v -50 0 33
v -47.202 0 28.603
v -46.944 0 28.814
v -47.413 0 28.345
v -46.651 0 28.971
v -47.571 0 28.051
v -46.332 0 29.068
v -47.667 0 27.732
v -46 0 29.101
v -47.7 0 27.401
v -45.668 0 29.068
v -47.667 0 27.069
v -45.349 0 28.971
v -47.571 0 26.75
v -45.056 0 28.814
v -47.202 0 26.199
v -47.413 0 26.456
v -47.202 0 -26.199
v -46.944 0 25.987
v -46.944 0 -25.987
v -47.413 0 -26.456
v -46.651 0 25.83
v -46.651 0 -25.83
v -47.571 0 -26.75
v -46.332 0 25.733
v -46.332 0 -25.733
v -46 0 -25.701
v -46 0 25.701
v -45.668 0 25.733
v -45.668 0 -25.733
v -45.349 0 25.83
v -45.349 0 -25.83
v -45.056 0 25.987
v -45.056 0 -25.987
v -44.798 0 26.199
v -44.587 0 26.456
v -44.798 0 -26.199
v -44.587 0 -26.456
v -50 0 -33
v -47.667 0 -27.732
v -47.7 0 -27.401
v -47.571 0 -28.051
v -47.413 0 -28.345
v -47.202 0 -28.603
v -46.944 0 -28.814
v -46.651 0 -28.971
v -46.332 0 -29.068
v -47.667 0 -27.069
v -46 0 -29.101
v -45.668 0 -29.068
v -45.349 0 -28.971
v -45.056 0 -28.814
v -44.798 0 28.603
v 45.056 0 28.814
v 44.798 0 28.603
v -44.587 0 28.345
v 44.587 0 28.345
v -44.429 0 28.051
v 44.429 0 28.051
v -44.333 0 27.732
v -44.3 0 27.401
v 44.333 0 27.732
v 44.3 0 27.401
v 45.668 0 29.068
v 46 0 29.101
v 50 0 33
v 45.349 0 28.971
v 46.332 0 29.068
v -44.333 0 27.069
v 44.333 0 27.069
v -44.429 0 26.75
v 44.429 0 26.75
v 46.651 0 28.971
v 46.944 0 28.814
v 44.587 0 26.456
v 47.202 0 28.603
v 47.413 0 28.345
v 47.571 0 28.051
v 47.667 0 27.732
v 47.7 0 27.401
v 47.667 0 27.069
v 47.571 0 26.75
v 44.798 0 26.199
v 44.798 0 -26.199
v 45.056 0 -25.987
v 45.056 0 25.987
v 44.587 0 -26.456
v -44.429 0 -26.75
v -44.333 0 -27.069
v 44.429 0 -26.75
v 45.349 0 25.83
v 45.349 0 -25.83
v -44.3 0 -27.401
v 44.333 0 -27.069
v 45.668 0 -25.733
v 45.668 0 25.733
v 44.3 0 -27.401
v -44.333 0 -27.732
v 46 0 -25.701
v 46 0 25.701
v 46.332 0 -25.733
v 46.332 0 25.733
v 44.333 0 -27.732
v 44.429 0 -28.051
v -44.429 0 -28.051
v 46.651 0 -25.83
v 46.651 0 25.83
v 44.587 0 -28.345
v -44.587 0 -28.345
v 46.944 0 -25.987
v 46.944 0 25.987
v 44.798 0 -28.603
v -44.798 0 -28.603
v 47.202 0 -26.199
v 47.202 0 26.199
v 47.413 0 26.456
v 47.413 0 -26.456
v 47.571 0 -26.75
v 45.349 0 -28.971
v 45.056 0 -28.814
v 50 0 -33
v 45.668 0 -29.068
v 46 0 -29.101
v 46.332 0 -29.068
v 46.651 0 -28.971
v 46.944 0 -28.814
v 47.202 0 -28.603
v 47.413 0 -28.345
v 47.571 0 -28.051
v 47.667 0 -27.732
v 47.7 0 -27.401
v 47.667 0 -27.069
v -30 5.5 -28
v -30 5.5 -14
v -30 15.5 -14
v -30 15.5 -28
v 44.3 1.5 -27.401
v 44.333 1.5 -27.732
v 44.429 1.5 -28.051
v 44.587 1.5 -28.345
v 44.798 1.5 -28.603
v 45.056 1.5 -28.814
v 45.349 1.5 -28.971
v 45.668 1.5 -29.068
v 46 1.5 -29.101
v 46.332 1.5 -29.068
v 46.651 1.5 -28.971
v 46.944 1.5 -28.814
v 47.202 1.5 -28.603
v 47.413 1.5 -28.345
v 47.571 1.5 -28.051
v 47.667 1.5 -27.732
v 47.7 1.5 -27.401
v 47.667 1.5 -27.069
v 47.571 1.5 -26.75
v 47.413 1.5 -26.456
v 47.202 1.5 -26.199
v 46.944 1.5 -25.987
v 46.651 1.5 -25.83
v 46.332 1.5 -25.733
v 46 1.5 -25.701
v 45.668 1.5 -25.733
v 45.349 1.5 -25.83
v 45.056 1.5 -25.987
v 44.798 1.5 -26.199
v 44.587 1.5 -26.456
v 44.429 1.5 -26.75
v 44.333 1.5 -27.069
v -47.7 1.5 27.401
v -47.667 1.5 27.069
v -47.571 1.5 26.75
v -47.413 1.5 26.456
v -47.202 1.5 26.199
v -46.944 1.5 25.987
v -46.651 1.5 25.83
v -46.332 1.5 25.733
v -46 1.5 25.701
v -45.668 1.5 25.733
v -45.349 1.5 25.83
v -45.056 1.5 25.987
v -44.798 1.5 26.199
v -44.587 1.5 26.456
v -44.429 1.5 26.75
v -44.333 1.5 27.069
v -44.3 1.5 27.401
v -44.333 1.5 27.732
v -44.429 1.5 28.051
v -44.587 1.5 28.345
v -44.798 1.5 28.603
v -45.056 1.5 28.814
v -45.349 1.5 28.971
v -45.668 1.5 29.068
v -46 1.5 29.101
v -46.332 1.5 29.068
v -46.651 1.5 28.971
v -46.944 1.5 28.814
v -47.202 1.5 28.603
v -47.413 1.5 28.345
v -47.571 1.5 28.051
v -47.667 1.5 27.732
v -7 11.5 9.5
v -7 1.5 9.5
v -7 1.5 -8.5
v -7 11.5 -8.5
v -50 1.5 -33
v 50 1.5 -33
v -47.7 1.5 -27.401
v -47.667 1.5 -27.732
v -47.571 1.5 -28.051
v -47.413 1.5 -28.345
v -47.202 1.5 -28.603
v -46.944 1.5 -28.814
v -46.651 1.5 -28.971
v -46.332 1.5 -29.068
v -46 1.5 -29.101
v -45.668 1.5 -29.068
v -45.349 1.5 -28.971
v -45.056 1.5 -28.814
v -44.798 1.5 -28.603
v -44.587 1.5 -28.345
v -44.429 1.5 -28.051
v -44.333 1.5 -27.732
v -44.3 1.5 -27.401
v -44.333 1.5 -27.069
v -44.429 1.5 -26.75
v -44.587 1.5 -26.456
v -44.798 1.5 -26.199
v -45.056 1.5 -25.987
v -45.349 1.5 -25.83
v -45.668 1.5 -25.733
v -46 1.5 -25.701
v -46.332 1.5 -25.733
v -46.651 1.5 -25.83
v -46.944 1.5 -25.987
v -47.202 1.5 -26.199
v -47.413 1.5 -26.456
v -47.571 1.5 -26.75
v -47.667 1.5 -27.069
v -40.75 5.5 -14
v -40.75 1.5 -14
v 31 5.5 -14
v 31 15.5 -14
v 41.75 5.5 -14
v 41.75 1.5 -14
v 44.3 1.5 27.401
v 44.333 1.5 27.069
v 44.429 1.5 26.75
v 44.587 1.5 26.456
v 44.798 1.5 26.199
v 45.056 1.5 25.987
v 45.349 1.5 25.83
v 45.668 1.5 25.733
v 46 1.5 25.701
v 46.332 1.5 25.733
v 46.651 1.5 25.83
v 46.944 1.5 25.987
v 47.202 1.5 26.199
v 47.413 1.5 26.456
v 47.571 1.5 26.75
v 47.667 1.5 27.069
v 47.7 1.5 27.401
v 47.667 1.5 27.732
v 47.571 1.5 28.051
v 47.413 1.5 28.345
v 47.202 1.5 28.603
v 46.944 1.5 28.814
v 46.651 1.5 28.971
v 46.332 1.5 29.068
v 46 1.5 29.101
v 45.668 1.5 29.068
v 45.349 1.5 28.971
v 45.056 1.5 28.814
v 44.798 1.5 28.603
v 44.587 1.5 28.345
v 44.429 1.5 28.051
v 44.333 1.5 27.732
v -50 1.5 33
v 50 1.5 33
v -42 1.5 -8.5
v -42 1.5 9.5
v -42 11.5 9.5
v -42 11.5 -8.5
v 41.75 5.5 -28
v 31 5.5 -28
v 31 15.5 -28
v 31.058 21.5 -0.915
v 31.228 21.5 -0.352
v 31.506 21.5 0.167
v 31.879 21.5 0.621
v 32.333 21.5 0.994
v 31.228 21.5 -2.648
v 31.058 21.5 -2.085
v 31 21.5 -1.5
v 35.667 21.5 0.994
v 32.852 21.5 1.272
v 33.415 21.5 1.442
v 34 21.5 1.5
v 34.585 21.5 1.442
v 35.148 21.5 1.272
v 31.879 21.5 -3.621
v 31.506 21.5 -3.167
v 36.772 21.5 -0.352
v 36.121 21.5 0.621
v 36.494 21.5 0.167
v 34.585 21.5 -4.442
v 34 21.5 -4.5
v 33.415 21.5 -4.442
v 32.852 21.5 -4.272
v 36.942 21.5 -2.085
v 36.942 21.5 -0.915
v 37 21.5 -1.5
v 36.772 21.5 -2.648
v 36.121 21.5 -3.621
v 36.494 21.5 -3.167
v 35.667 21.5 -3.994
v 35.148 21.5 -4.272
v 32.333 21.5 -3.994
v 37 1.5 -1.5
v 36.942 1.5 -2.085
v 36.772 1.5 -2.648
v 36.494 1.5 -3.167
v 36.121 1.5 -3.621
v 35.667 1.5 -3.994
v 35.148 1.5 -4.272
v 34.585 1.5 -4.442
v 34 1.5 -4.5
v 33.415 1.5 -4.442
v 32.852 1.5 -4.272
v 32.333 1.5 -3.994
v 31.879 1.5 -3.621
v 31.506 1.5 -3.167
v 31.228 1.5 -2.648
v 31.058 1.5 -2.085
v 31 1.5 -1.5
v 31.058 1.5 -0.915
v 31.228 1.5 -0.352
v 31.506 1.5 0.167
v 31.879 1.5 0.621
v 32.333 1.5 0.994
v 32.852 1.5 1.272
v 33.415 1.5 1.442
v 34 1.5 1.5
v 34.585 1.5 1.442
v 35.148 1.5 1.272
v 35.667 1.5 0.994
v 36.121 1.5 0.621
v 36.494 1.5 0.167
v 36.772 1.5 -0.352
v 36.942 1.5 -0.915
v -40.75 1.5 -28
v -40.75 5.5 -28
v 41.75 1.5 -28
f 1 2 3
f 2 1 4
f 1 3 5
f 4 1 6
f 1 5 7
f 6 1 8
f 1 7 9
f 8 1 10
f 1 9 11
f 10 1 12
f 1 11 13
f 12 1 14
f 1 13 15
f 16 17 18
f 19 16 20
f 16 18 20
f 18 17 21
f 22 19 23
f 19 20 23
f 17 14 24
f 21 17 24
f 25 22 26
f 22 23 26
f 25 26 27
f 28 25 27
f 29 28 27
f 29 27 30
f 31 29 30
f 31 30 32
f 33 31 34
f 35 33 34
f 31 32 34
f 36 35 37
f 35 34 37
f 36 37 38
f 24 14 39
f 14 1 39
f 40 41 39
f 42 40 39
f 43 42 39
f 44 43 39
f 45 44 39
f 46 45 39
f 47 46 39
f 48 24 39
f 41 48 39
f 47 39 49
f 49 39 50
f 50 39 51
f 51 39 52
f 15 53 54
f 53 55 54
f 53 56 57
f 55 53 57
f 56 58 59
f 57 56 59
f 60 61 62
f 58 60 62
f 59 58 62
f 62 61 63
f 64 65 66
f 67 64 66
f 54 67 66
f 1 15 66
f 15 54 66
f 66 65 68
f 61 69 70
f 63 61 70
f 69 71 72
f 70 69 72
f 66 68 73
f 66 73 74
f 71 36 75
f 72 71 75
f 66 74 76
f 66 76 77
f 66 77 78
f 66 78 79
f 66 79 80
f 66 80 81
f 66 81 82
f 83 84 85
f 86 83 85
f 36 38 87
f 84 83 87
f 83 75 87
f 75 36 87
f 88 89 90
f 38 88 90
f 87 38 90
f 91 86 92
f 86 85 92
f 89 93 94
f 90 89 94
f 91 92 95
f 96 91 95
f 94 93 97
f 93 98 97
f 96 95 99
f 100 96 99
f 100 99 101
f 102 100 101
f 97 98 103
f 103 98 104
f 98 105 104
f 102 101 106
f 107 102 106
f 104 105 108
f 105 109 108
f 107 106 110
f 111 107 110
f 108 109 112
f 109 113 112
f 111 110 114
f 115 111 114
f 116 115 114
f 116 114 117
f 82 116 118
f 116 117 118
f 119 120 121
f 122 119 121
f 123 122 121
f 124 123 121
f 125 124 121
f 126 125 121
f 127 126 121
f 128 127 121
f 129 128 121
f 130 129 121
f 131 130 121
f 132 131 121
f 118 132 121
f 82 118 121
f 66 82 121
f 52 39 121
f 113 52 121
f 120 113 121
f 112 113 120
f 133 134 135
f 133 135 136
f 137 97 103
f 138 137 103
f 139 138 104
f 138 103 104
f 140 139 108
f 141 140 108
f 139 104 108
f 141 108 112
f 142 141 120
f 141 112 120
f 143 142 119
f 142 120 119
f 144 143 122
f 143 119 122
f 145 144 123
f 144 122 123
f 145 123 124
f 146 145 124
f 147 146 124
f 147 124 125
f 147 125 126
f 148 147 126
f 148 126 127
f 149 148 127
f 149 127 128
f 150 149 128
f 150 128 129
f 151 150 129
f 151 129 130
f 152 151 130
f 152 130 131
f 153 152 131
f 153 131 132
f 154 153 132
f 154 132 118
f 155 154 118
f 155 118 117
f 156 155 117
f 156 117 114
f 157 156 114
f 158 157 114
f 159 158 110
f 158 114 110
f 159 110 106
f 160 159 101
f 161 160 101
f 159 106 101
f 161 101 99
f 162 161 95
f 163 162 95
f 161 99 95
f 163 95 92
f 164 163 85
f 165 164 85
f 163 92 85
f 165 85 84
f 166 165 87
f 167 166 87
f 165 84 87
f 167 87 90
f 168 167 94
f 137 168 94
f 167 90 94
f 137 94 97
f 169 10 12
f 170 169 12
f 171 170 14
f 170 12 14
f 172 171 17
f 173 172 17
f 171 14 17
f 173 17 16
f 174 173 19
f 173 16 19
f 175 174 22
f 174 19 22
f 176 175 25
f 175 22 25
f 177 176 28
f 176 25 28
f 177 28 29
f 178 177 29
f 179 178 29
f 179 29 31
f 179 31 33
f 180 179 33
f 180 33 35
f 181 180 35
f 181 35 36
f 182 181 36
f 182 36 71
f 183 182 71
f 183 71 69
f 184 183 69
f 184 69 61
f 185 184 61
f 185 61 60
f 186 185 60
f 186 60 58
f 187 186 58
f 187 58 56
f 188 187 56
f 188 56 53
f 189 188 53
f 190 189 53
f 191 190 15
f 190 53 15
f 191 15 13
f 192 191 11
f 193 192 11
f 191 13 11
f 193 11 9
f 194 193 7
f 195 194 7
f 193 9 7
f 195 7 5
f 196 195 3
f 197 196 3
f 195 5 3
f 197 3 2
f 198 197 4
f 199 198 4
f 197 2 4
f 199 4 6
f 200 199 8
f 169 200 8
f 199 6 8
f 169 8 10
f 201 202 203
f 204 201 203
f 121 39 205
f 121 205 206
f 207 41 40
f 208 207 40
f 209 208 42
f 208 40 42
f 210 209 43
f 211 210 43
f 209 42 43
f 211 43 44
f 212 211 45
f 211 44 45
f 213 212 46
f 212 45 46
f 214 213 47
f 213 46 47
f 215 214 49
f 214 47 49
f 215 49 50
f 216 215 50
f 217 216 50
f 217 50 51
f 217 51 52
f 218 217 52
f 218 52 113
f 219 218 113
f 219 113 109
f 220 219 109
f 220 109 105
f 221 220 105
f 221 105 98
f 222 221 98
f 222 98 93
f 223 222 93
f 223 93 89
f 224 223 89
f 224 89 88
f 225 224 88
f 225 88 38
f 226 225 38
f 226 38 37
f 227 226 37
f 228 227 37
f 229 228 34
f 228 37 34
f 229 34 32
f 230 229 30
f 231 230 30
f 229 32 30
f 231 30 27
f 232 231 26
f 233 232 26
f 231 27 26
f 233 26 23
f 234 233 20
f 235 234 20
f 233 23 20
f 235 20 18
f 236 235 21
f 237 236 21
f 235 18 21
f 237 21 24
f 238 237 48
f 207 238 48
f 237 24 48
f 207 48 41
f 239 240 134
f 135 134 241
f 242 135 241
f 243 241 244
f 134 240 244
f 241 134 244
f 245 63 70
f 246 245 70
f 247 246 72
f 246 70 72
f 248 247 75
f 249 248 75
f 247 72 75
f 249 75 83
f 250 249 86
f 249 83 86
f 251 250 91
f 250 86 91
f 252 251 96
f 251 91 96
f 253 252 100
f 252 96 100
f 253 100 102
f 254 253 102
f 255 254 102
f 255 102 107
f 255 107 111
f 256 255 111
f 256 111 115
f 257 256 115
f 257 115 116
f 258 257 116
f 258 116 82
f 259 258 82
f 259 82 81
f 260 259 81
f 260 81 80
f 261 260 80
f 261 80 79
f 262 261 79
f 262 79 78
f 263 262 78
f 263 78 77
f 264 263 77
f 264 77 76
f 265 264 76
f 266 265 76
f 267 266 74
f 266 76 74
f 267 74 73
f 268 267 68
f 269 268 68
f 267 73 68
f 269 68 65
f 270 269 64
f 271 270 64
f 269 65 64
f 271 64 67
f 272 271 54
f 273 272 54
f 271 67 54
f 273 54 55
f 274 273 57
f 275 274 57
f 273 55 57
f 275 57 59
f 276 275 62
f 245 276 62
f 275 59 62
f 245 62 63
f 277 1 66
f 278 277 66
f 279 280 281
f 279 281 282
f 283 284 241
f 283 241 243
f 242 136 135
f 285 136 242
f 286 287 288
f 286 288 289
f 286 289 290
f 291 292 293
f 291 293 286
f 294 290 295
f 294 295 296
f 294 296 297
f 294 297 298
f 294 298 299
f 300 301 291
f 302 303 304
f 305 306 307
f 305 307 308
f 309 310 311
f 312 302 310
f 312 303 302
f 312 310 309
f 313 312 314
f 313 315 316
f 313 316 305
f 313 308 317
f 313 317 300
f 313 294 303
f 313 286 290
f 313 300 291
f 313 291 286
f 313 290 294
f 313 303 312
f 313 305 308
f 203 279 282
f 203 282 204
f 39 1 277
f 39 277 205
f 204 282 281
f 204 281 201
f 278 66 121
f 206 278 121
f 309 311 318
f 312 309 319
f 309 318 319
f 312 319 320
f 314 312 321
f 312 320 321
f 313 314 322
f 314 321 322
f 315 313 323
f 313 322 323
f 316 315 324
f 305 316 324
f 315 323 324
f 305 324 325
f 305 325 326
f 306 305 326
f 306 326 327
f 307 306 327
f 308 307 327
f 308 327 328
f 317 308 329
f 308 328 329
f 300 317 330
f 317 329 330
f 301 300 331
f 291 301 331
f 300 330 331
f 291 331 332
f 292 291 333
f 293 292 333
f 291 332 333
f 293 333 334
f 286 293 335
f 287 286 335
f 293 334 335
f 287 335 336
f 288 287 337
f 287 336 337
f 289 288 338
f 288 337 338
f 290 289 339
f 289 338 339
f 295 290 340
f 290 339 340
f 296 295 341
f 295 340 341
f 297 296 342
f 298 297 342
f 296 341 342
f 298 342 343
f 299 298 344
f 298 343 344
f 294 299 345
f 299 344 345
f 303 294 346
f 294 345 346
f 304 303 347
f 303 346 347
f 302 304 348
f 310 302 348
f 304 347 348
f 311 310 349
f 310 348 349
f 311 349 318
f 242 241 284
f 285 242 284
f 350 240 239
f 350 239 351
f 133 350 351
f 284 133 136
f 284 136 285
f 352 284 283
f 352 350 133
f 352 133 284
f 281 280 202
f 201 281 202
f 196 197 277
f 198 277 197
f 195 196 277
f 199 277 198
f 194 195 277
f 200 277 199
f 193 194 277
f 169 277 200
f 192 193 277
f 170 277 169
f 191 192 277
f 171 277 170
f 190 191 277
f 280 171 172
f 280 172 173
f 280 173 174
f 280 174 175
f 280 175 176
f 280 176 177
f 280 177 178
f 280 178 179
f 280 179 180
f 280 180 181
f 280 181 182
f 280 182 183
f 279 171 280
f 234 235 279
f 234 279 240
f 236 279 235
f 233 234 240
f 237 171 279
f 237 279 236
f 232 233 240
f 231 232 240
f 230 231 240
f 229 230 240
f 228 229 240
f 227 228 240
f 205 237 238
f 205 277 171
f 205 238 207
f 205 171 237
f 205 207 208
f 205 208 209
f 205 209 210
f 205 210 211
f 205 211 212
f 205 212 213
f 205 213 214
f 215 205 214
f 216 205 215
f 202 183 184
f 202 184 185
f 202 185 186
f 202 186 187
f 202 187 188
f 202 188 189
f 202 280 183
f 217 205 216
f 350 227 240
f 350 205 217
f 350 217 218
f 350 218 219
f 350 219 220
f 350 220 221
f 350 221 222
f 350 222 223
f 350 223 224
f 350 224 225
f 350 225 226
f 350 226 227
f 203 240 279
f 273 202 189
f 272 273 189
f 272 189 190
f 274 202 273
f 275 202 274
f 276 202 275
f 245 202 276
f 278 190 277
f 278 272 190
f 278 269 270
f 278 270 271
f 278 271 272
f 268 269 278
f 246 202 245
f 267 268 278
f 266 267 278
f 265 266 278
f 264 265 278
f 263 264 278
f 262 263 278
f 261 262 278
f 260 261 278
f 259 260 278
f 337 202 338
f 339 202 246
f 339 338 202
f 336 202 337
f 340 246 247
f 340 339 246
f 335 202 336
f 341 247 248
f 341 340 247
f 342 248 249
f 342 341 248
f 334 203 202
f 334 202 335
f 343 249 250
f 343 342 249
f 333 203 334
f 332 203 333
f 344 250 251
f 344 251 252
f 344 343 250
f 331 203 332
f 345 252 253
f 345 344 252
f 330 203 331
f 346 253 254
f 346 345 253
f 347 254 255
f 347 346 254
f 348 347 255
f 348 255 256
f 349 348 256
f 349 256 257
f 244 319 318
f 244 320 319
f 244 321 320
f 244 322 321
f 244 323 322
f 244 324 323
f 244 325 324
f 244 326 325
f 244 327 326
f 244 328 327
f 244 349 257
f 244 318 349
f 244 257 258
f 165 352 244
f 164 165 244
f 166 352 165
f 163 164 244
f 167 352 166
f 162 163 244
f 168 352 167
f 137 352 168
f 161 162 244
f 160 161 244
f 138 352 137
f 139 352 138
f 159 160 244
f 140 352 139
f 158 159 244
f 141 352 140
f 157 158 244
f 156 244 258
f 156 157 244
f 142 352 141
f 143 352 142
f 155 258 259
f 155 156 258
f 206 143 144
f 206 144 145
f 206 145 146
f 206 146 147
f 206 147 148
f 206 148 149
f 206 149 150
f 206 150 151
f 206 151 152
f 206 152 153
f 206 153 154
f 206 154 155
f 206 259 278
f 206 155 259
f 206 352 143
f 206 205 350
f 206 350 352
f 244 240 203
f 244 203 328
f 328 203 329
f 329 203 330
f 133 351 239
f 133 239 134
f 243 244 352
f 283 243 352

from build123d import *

# Parameters (mm, degrees)
SKIZZE1_W                       = 100
SKIZZE1_H                       = 66
AUFSATZ_LINEAR_AUSTRAGEN1_DEPTH = 1.5
SKIZZE2_W                       = 61
SKIZZE2_H                       = 14
AUFSATZ_LINEAR_AUSTRAGEN2_DEPTH = 14
SKIZZE6_W                       = 82.5
SKIZZE6_H                       = 14
AUFSATZ_LINEAR_AUSTRAGEN4_DEPTH = 4
SKIZZE3_R                       = 3
AUFSATZ_LINEAR_AUSTRAGEN3_DEPTH = 20
DURCHGANGSLOCH_F_R_M31_D        = 3.4
SKIZZE7_W                       = 35
SKIZZE7_H                       = 18
AUFSATZ_LINEAR_AUSTRAGEN5_DEPTH = 10


with BuildPart() as part:
    # Skizze1 → Aufsatz-Linear austragen1 (new body)
    with BuildSketch(Plane(origin=(0, 0, 0), x_dir=(1, 0, 0), z_dir=(0, 1, 0))):
        Rectangle(SKIZZE1_W, SKIZZE1_H)
    extrude(amount=AUFSATZ_LINEAR_AUSTRAGEN1_DEPTH)

    # Skizze2 → Aufsatz-Linear austragen2 (add)
    with BuildSketch(Plane(origin=(0, 1.5, 0), x_dir=(1, 0, 0), z_dir=(0, 1, 0))):
        with Locations((0.5, 21)):
            Rectangle(SKIZZE2_W, SKIZZE2_H)
    extrude(amount=AUFSATZ_LINEAR_AUSTRAGEN2_DEPTH)

    # Skizze6 → Aufsatz-Linear austragen4 (add)
    with BuildSketch(Plane(origin=(0, 1.5, 0), x_dir=(1, 0, 0), z_dir=(0, 1, 0))):
        with Locations((0.5, 21)):
            Rectangle(SKIZZE6_W, SKIZZE6_H)
    extrude(amount=AUFSATZ_LINEAR_AUSTRAGEN4_DEPTH)

    # Skizze3 → Aufsatz-Linear austragen3 (add)
    with BuildSketch(Plane(origin=(0, 1.5, 0), x_dir=(1, 0, 0), z_dir=(0, 1, 0))):
        with Locations((34, 1.5)):
            Circle(SKIZZE3_R)
    extrude(amount=AUFSATZ_LINEAR_AUSTRAGEN3_DEPTH)

    # Durchgangsloch für M31 (through all)
    with Locations(Plane(origin=(0, 1.5, 0), x_dir=(1, 0, 0), z_dir=(0, 1, 0))):
        with Locations((-46, -27.400776428), (-46, 27.400776428), (46, 27.400776428), (46, -27.400776428)):
            Hole(DURCHGANGSLOCH_F_R_M31_D / 2)

    # Skizze7 → Aufsatz-Linear austragen5 (add)
    with BuildSketch(Plane(origin=(0, 1.5, 0), x_dir=(1, 0, 0), z_dir=(0, 1, 0))):
        with Locations((-24.5, -0.5)):
            Rectangle(SKIZZE7_W, SKIZZE7_H)
    extrude(amount=AUFSATZ_LINEAR_AUSTRAGEN5_DEPTH)


solid = part.part
